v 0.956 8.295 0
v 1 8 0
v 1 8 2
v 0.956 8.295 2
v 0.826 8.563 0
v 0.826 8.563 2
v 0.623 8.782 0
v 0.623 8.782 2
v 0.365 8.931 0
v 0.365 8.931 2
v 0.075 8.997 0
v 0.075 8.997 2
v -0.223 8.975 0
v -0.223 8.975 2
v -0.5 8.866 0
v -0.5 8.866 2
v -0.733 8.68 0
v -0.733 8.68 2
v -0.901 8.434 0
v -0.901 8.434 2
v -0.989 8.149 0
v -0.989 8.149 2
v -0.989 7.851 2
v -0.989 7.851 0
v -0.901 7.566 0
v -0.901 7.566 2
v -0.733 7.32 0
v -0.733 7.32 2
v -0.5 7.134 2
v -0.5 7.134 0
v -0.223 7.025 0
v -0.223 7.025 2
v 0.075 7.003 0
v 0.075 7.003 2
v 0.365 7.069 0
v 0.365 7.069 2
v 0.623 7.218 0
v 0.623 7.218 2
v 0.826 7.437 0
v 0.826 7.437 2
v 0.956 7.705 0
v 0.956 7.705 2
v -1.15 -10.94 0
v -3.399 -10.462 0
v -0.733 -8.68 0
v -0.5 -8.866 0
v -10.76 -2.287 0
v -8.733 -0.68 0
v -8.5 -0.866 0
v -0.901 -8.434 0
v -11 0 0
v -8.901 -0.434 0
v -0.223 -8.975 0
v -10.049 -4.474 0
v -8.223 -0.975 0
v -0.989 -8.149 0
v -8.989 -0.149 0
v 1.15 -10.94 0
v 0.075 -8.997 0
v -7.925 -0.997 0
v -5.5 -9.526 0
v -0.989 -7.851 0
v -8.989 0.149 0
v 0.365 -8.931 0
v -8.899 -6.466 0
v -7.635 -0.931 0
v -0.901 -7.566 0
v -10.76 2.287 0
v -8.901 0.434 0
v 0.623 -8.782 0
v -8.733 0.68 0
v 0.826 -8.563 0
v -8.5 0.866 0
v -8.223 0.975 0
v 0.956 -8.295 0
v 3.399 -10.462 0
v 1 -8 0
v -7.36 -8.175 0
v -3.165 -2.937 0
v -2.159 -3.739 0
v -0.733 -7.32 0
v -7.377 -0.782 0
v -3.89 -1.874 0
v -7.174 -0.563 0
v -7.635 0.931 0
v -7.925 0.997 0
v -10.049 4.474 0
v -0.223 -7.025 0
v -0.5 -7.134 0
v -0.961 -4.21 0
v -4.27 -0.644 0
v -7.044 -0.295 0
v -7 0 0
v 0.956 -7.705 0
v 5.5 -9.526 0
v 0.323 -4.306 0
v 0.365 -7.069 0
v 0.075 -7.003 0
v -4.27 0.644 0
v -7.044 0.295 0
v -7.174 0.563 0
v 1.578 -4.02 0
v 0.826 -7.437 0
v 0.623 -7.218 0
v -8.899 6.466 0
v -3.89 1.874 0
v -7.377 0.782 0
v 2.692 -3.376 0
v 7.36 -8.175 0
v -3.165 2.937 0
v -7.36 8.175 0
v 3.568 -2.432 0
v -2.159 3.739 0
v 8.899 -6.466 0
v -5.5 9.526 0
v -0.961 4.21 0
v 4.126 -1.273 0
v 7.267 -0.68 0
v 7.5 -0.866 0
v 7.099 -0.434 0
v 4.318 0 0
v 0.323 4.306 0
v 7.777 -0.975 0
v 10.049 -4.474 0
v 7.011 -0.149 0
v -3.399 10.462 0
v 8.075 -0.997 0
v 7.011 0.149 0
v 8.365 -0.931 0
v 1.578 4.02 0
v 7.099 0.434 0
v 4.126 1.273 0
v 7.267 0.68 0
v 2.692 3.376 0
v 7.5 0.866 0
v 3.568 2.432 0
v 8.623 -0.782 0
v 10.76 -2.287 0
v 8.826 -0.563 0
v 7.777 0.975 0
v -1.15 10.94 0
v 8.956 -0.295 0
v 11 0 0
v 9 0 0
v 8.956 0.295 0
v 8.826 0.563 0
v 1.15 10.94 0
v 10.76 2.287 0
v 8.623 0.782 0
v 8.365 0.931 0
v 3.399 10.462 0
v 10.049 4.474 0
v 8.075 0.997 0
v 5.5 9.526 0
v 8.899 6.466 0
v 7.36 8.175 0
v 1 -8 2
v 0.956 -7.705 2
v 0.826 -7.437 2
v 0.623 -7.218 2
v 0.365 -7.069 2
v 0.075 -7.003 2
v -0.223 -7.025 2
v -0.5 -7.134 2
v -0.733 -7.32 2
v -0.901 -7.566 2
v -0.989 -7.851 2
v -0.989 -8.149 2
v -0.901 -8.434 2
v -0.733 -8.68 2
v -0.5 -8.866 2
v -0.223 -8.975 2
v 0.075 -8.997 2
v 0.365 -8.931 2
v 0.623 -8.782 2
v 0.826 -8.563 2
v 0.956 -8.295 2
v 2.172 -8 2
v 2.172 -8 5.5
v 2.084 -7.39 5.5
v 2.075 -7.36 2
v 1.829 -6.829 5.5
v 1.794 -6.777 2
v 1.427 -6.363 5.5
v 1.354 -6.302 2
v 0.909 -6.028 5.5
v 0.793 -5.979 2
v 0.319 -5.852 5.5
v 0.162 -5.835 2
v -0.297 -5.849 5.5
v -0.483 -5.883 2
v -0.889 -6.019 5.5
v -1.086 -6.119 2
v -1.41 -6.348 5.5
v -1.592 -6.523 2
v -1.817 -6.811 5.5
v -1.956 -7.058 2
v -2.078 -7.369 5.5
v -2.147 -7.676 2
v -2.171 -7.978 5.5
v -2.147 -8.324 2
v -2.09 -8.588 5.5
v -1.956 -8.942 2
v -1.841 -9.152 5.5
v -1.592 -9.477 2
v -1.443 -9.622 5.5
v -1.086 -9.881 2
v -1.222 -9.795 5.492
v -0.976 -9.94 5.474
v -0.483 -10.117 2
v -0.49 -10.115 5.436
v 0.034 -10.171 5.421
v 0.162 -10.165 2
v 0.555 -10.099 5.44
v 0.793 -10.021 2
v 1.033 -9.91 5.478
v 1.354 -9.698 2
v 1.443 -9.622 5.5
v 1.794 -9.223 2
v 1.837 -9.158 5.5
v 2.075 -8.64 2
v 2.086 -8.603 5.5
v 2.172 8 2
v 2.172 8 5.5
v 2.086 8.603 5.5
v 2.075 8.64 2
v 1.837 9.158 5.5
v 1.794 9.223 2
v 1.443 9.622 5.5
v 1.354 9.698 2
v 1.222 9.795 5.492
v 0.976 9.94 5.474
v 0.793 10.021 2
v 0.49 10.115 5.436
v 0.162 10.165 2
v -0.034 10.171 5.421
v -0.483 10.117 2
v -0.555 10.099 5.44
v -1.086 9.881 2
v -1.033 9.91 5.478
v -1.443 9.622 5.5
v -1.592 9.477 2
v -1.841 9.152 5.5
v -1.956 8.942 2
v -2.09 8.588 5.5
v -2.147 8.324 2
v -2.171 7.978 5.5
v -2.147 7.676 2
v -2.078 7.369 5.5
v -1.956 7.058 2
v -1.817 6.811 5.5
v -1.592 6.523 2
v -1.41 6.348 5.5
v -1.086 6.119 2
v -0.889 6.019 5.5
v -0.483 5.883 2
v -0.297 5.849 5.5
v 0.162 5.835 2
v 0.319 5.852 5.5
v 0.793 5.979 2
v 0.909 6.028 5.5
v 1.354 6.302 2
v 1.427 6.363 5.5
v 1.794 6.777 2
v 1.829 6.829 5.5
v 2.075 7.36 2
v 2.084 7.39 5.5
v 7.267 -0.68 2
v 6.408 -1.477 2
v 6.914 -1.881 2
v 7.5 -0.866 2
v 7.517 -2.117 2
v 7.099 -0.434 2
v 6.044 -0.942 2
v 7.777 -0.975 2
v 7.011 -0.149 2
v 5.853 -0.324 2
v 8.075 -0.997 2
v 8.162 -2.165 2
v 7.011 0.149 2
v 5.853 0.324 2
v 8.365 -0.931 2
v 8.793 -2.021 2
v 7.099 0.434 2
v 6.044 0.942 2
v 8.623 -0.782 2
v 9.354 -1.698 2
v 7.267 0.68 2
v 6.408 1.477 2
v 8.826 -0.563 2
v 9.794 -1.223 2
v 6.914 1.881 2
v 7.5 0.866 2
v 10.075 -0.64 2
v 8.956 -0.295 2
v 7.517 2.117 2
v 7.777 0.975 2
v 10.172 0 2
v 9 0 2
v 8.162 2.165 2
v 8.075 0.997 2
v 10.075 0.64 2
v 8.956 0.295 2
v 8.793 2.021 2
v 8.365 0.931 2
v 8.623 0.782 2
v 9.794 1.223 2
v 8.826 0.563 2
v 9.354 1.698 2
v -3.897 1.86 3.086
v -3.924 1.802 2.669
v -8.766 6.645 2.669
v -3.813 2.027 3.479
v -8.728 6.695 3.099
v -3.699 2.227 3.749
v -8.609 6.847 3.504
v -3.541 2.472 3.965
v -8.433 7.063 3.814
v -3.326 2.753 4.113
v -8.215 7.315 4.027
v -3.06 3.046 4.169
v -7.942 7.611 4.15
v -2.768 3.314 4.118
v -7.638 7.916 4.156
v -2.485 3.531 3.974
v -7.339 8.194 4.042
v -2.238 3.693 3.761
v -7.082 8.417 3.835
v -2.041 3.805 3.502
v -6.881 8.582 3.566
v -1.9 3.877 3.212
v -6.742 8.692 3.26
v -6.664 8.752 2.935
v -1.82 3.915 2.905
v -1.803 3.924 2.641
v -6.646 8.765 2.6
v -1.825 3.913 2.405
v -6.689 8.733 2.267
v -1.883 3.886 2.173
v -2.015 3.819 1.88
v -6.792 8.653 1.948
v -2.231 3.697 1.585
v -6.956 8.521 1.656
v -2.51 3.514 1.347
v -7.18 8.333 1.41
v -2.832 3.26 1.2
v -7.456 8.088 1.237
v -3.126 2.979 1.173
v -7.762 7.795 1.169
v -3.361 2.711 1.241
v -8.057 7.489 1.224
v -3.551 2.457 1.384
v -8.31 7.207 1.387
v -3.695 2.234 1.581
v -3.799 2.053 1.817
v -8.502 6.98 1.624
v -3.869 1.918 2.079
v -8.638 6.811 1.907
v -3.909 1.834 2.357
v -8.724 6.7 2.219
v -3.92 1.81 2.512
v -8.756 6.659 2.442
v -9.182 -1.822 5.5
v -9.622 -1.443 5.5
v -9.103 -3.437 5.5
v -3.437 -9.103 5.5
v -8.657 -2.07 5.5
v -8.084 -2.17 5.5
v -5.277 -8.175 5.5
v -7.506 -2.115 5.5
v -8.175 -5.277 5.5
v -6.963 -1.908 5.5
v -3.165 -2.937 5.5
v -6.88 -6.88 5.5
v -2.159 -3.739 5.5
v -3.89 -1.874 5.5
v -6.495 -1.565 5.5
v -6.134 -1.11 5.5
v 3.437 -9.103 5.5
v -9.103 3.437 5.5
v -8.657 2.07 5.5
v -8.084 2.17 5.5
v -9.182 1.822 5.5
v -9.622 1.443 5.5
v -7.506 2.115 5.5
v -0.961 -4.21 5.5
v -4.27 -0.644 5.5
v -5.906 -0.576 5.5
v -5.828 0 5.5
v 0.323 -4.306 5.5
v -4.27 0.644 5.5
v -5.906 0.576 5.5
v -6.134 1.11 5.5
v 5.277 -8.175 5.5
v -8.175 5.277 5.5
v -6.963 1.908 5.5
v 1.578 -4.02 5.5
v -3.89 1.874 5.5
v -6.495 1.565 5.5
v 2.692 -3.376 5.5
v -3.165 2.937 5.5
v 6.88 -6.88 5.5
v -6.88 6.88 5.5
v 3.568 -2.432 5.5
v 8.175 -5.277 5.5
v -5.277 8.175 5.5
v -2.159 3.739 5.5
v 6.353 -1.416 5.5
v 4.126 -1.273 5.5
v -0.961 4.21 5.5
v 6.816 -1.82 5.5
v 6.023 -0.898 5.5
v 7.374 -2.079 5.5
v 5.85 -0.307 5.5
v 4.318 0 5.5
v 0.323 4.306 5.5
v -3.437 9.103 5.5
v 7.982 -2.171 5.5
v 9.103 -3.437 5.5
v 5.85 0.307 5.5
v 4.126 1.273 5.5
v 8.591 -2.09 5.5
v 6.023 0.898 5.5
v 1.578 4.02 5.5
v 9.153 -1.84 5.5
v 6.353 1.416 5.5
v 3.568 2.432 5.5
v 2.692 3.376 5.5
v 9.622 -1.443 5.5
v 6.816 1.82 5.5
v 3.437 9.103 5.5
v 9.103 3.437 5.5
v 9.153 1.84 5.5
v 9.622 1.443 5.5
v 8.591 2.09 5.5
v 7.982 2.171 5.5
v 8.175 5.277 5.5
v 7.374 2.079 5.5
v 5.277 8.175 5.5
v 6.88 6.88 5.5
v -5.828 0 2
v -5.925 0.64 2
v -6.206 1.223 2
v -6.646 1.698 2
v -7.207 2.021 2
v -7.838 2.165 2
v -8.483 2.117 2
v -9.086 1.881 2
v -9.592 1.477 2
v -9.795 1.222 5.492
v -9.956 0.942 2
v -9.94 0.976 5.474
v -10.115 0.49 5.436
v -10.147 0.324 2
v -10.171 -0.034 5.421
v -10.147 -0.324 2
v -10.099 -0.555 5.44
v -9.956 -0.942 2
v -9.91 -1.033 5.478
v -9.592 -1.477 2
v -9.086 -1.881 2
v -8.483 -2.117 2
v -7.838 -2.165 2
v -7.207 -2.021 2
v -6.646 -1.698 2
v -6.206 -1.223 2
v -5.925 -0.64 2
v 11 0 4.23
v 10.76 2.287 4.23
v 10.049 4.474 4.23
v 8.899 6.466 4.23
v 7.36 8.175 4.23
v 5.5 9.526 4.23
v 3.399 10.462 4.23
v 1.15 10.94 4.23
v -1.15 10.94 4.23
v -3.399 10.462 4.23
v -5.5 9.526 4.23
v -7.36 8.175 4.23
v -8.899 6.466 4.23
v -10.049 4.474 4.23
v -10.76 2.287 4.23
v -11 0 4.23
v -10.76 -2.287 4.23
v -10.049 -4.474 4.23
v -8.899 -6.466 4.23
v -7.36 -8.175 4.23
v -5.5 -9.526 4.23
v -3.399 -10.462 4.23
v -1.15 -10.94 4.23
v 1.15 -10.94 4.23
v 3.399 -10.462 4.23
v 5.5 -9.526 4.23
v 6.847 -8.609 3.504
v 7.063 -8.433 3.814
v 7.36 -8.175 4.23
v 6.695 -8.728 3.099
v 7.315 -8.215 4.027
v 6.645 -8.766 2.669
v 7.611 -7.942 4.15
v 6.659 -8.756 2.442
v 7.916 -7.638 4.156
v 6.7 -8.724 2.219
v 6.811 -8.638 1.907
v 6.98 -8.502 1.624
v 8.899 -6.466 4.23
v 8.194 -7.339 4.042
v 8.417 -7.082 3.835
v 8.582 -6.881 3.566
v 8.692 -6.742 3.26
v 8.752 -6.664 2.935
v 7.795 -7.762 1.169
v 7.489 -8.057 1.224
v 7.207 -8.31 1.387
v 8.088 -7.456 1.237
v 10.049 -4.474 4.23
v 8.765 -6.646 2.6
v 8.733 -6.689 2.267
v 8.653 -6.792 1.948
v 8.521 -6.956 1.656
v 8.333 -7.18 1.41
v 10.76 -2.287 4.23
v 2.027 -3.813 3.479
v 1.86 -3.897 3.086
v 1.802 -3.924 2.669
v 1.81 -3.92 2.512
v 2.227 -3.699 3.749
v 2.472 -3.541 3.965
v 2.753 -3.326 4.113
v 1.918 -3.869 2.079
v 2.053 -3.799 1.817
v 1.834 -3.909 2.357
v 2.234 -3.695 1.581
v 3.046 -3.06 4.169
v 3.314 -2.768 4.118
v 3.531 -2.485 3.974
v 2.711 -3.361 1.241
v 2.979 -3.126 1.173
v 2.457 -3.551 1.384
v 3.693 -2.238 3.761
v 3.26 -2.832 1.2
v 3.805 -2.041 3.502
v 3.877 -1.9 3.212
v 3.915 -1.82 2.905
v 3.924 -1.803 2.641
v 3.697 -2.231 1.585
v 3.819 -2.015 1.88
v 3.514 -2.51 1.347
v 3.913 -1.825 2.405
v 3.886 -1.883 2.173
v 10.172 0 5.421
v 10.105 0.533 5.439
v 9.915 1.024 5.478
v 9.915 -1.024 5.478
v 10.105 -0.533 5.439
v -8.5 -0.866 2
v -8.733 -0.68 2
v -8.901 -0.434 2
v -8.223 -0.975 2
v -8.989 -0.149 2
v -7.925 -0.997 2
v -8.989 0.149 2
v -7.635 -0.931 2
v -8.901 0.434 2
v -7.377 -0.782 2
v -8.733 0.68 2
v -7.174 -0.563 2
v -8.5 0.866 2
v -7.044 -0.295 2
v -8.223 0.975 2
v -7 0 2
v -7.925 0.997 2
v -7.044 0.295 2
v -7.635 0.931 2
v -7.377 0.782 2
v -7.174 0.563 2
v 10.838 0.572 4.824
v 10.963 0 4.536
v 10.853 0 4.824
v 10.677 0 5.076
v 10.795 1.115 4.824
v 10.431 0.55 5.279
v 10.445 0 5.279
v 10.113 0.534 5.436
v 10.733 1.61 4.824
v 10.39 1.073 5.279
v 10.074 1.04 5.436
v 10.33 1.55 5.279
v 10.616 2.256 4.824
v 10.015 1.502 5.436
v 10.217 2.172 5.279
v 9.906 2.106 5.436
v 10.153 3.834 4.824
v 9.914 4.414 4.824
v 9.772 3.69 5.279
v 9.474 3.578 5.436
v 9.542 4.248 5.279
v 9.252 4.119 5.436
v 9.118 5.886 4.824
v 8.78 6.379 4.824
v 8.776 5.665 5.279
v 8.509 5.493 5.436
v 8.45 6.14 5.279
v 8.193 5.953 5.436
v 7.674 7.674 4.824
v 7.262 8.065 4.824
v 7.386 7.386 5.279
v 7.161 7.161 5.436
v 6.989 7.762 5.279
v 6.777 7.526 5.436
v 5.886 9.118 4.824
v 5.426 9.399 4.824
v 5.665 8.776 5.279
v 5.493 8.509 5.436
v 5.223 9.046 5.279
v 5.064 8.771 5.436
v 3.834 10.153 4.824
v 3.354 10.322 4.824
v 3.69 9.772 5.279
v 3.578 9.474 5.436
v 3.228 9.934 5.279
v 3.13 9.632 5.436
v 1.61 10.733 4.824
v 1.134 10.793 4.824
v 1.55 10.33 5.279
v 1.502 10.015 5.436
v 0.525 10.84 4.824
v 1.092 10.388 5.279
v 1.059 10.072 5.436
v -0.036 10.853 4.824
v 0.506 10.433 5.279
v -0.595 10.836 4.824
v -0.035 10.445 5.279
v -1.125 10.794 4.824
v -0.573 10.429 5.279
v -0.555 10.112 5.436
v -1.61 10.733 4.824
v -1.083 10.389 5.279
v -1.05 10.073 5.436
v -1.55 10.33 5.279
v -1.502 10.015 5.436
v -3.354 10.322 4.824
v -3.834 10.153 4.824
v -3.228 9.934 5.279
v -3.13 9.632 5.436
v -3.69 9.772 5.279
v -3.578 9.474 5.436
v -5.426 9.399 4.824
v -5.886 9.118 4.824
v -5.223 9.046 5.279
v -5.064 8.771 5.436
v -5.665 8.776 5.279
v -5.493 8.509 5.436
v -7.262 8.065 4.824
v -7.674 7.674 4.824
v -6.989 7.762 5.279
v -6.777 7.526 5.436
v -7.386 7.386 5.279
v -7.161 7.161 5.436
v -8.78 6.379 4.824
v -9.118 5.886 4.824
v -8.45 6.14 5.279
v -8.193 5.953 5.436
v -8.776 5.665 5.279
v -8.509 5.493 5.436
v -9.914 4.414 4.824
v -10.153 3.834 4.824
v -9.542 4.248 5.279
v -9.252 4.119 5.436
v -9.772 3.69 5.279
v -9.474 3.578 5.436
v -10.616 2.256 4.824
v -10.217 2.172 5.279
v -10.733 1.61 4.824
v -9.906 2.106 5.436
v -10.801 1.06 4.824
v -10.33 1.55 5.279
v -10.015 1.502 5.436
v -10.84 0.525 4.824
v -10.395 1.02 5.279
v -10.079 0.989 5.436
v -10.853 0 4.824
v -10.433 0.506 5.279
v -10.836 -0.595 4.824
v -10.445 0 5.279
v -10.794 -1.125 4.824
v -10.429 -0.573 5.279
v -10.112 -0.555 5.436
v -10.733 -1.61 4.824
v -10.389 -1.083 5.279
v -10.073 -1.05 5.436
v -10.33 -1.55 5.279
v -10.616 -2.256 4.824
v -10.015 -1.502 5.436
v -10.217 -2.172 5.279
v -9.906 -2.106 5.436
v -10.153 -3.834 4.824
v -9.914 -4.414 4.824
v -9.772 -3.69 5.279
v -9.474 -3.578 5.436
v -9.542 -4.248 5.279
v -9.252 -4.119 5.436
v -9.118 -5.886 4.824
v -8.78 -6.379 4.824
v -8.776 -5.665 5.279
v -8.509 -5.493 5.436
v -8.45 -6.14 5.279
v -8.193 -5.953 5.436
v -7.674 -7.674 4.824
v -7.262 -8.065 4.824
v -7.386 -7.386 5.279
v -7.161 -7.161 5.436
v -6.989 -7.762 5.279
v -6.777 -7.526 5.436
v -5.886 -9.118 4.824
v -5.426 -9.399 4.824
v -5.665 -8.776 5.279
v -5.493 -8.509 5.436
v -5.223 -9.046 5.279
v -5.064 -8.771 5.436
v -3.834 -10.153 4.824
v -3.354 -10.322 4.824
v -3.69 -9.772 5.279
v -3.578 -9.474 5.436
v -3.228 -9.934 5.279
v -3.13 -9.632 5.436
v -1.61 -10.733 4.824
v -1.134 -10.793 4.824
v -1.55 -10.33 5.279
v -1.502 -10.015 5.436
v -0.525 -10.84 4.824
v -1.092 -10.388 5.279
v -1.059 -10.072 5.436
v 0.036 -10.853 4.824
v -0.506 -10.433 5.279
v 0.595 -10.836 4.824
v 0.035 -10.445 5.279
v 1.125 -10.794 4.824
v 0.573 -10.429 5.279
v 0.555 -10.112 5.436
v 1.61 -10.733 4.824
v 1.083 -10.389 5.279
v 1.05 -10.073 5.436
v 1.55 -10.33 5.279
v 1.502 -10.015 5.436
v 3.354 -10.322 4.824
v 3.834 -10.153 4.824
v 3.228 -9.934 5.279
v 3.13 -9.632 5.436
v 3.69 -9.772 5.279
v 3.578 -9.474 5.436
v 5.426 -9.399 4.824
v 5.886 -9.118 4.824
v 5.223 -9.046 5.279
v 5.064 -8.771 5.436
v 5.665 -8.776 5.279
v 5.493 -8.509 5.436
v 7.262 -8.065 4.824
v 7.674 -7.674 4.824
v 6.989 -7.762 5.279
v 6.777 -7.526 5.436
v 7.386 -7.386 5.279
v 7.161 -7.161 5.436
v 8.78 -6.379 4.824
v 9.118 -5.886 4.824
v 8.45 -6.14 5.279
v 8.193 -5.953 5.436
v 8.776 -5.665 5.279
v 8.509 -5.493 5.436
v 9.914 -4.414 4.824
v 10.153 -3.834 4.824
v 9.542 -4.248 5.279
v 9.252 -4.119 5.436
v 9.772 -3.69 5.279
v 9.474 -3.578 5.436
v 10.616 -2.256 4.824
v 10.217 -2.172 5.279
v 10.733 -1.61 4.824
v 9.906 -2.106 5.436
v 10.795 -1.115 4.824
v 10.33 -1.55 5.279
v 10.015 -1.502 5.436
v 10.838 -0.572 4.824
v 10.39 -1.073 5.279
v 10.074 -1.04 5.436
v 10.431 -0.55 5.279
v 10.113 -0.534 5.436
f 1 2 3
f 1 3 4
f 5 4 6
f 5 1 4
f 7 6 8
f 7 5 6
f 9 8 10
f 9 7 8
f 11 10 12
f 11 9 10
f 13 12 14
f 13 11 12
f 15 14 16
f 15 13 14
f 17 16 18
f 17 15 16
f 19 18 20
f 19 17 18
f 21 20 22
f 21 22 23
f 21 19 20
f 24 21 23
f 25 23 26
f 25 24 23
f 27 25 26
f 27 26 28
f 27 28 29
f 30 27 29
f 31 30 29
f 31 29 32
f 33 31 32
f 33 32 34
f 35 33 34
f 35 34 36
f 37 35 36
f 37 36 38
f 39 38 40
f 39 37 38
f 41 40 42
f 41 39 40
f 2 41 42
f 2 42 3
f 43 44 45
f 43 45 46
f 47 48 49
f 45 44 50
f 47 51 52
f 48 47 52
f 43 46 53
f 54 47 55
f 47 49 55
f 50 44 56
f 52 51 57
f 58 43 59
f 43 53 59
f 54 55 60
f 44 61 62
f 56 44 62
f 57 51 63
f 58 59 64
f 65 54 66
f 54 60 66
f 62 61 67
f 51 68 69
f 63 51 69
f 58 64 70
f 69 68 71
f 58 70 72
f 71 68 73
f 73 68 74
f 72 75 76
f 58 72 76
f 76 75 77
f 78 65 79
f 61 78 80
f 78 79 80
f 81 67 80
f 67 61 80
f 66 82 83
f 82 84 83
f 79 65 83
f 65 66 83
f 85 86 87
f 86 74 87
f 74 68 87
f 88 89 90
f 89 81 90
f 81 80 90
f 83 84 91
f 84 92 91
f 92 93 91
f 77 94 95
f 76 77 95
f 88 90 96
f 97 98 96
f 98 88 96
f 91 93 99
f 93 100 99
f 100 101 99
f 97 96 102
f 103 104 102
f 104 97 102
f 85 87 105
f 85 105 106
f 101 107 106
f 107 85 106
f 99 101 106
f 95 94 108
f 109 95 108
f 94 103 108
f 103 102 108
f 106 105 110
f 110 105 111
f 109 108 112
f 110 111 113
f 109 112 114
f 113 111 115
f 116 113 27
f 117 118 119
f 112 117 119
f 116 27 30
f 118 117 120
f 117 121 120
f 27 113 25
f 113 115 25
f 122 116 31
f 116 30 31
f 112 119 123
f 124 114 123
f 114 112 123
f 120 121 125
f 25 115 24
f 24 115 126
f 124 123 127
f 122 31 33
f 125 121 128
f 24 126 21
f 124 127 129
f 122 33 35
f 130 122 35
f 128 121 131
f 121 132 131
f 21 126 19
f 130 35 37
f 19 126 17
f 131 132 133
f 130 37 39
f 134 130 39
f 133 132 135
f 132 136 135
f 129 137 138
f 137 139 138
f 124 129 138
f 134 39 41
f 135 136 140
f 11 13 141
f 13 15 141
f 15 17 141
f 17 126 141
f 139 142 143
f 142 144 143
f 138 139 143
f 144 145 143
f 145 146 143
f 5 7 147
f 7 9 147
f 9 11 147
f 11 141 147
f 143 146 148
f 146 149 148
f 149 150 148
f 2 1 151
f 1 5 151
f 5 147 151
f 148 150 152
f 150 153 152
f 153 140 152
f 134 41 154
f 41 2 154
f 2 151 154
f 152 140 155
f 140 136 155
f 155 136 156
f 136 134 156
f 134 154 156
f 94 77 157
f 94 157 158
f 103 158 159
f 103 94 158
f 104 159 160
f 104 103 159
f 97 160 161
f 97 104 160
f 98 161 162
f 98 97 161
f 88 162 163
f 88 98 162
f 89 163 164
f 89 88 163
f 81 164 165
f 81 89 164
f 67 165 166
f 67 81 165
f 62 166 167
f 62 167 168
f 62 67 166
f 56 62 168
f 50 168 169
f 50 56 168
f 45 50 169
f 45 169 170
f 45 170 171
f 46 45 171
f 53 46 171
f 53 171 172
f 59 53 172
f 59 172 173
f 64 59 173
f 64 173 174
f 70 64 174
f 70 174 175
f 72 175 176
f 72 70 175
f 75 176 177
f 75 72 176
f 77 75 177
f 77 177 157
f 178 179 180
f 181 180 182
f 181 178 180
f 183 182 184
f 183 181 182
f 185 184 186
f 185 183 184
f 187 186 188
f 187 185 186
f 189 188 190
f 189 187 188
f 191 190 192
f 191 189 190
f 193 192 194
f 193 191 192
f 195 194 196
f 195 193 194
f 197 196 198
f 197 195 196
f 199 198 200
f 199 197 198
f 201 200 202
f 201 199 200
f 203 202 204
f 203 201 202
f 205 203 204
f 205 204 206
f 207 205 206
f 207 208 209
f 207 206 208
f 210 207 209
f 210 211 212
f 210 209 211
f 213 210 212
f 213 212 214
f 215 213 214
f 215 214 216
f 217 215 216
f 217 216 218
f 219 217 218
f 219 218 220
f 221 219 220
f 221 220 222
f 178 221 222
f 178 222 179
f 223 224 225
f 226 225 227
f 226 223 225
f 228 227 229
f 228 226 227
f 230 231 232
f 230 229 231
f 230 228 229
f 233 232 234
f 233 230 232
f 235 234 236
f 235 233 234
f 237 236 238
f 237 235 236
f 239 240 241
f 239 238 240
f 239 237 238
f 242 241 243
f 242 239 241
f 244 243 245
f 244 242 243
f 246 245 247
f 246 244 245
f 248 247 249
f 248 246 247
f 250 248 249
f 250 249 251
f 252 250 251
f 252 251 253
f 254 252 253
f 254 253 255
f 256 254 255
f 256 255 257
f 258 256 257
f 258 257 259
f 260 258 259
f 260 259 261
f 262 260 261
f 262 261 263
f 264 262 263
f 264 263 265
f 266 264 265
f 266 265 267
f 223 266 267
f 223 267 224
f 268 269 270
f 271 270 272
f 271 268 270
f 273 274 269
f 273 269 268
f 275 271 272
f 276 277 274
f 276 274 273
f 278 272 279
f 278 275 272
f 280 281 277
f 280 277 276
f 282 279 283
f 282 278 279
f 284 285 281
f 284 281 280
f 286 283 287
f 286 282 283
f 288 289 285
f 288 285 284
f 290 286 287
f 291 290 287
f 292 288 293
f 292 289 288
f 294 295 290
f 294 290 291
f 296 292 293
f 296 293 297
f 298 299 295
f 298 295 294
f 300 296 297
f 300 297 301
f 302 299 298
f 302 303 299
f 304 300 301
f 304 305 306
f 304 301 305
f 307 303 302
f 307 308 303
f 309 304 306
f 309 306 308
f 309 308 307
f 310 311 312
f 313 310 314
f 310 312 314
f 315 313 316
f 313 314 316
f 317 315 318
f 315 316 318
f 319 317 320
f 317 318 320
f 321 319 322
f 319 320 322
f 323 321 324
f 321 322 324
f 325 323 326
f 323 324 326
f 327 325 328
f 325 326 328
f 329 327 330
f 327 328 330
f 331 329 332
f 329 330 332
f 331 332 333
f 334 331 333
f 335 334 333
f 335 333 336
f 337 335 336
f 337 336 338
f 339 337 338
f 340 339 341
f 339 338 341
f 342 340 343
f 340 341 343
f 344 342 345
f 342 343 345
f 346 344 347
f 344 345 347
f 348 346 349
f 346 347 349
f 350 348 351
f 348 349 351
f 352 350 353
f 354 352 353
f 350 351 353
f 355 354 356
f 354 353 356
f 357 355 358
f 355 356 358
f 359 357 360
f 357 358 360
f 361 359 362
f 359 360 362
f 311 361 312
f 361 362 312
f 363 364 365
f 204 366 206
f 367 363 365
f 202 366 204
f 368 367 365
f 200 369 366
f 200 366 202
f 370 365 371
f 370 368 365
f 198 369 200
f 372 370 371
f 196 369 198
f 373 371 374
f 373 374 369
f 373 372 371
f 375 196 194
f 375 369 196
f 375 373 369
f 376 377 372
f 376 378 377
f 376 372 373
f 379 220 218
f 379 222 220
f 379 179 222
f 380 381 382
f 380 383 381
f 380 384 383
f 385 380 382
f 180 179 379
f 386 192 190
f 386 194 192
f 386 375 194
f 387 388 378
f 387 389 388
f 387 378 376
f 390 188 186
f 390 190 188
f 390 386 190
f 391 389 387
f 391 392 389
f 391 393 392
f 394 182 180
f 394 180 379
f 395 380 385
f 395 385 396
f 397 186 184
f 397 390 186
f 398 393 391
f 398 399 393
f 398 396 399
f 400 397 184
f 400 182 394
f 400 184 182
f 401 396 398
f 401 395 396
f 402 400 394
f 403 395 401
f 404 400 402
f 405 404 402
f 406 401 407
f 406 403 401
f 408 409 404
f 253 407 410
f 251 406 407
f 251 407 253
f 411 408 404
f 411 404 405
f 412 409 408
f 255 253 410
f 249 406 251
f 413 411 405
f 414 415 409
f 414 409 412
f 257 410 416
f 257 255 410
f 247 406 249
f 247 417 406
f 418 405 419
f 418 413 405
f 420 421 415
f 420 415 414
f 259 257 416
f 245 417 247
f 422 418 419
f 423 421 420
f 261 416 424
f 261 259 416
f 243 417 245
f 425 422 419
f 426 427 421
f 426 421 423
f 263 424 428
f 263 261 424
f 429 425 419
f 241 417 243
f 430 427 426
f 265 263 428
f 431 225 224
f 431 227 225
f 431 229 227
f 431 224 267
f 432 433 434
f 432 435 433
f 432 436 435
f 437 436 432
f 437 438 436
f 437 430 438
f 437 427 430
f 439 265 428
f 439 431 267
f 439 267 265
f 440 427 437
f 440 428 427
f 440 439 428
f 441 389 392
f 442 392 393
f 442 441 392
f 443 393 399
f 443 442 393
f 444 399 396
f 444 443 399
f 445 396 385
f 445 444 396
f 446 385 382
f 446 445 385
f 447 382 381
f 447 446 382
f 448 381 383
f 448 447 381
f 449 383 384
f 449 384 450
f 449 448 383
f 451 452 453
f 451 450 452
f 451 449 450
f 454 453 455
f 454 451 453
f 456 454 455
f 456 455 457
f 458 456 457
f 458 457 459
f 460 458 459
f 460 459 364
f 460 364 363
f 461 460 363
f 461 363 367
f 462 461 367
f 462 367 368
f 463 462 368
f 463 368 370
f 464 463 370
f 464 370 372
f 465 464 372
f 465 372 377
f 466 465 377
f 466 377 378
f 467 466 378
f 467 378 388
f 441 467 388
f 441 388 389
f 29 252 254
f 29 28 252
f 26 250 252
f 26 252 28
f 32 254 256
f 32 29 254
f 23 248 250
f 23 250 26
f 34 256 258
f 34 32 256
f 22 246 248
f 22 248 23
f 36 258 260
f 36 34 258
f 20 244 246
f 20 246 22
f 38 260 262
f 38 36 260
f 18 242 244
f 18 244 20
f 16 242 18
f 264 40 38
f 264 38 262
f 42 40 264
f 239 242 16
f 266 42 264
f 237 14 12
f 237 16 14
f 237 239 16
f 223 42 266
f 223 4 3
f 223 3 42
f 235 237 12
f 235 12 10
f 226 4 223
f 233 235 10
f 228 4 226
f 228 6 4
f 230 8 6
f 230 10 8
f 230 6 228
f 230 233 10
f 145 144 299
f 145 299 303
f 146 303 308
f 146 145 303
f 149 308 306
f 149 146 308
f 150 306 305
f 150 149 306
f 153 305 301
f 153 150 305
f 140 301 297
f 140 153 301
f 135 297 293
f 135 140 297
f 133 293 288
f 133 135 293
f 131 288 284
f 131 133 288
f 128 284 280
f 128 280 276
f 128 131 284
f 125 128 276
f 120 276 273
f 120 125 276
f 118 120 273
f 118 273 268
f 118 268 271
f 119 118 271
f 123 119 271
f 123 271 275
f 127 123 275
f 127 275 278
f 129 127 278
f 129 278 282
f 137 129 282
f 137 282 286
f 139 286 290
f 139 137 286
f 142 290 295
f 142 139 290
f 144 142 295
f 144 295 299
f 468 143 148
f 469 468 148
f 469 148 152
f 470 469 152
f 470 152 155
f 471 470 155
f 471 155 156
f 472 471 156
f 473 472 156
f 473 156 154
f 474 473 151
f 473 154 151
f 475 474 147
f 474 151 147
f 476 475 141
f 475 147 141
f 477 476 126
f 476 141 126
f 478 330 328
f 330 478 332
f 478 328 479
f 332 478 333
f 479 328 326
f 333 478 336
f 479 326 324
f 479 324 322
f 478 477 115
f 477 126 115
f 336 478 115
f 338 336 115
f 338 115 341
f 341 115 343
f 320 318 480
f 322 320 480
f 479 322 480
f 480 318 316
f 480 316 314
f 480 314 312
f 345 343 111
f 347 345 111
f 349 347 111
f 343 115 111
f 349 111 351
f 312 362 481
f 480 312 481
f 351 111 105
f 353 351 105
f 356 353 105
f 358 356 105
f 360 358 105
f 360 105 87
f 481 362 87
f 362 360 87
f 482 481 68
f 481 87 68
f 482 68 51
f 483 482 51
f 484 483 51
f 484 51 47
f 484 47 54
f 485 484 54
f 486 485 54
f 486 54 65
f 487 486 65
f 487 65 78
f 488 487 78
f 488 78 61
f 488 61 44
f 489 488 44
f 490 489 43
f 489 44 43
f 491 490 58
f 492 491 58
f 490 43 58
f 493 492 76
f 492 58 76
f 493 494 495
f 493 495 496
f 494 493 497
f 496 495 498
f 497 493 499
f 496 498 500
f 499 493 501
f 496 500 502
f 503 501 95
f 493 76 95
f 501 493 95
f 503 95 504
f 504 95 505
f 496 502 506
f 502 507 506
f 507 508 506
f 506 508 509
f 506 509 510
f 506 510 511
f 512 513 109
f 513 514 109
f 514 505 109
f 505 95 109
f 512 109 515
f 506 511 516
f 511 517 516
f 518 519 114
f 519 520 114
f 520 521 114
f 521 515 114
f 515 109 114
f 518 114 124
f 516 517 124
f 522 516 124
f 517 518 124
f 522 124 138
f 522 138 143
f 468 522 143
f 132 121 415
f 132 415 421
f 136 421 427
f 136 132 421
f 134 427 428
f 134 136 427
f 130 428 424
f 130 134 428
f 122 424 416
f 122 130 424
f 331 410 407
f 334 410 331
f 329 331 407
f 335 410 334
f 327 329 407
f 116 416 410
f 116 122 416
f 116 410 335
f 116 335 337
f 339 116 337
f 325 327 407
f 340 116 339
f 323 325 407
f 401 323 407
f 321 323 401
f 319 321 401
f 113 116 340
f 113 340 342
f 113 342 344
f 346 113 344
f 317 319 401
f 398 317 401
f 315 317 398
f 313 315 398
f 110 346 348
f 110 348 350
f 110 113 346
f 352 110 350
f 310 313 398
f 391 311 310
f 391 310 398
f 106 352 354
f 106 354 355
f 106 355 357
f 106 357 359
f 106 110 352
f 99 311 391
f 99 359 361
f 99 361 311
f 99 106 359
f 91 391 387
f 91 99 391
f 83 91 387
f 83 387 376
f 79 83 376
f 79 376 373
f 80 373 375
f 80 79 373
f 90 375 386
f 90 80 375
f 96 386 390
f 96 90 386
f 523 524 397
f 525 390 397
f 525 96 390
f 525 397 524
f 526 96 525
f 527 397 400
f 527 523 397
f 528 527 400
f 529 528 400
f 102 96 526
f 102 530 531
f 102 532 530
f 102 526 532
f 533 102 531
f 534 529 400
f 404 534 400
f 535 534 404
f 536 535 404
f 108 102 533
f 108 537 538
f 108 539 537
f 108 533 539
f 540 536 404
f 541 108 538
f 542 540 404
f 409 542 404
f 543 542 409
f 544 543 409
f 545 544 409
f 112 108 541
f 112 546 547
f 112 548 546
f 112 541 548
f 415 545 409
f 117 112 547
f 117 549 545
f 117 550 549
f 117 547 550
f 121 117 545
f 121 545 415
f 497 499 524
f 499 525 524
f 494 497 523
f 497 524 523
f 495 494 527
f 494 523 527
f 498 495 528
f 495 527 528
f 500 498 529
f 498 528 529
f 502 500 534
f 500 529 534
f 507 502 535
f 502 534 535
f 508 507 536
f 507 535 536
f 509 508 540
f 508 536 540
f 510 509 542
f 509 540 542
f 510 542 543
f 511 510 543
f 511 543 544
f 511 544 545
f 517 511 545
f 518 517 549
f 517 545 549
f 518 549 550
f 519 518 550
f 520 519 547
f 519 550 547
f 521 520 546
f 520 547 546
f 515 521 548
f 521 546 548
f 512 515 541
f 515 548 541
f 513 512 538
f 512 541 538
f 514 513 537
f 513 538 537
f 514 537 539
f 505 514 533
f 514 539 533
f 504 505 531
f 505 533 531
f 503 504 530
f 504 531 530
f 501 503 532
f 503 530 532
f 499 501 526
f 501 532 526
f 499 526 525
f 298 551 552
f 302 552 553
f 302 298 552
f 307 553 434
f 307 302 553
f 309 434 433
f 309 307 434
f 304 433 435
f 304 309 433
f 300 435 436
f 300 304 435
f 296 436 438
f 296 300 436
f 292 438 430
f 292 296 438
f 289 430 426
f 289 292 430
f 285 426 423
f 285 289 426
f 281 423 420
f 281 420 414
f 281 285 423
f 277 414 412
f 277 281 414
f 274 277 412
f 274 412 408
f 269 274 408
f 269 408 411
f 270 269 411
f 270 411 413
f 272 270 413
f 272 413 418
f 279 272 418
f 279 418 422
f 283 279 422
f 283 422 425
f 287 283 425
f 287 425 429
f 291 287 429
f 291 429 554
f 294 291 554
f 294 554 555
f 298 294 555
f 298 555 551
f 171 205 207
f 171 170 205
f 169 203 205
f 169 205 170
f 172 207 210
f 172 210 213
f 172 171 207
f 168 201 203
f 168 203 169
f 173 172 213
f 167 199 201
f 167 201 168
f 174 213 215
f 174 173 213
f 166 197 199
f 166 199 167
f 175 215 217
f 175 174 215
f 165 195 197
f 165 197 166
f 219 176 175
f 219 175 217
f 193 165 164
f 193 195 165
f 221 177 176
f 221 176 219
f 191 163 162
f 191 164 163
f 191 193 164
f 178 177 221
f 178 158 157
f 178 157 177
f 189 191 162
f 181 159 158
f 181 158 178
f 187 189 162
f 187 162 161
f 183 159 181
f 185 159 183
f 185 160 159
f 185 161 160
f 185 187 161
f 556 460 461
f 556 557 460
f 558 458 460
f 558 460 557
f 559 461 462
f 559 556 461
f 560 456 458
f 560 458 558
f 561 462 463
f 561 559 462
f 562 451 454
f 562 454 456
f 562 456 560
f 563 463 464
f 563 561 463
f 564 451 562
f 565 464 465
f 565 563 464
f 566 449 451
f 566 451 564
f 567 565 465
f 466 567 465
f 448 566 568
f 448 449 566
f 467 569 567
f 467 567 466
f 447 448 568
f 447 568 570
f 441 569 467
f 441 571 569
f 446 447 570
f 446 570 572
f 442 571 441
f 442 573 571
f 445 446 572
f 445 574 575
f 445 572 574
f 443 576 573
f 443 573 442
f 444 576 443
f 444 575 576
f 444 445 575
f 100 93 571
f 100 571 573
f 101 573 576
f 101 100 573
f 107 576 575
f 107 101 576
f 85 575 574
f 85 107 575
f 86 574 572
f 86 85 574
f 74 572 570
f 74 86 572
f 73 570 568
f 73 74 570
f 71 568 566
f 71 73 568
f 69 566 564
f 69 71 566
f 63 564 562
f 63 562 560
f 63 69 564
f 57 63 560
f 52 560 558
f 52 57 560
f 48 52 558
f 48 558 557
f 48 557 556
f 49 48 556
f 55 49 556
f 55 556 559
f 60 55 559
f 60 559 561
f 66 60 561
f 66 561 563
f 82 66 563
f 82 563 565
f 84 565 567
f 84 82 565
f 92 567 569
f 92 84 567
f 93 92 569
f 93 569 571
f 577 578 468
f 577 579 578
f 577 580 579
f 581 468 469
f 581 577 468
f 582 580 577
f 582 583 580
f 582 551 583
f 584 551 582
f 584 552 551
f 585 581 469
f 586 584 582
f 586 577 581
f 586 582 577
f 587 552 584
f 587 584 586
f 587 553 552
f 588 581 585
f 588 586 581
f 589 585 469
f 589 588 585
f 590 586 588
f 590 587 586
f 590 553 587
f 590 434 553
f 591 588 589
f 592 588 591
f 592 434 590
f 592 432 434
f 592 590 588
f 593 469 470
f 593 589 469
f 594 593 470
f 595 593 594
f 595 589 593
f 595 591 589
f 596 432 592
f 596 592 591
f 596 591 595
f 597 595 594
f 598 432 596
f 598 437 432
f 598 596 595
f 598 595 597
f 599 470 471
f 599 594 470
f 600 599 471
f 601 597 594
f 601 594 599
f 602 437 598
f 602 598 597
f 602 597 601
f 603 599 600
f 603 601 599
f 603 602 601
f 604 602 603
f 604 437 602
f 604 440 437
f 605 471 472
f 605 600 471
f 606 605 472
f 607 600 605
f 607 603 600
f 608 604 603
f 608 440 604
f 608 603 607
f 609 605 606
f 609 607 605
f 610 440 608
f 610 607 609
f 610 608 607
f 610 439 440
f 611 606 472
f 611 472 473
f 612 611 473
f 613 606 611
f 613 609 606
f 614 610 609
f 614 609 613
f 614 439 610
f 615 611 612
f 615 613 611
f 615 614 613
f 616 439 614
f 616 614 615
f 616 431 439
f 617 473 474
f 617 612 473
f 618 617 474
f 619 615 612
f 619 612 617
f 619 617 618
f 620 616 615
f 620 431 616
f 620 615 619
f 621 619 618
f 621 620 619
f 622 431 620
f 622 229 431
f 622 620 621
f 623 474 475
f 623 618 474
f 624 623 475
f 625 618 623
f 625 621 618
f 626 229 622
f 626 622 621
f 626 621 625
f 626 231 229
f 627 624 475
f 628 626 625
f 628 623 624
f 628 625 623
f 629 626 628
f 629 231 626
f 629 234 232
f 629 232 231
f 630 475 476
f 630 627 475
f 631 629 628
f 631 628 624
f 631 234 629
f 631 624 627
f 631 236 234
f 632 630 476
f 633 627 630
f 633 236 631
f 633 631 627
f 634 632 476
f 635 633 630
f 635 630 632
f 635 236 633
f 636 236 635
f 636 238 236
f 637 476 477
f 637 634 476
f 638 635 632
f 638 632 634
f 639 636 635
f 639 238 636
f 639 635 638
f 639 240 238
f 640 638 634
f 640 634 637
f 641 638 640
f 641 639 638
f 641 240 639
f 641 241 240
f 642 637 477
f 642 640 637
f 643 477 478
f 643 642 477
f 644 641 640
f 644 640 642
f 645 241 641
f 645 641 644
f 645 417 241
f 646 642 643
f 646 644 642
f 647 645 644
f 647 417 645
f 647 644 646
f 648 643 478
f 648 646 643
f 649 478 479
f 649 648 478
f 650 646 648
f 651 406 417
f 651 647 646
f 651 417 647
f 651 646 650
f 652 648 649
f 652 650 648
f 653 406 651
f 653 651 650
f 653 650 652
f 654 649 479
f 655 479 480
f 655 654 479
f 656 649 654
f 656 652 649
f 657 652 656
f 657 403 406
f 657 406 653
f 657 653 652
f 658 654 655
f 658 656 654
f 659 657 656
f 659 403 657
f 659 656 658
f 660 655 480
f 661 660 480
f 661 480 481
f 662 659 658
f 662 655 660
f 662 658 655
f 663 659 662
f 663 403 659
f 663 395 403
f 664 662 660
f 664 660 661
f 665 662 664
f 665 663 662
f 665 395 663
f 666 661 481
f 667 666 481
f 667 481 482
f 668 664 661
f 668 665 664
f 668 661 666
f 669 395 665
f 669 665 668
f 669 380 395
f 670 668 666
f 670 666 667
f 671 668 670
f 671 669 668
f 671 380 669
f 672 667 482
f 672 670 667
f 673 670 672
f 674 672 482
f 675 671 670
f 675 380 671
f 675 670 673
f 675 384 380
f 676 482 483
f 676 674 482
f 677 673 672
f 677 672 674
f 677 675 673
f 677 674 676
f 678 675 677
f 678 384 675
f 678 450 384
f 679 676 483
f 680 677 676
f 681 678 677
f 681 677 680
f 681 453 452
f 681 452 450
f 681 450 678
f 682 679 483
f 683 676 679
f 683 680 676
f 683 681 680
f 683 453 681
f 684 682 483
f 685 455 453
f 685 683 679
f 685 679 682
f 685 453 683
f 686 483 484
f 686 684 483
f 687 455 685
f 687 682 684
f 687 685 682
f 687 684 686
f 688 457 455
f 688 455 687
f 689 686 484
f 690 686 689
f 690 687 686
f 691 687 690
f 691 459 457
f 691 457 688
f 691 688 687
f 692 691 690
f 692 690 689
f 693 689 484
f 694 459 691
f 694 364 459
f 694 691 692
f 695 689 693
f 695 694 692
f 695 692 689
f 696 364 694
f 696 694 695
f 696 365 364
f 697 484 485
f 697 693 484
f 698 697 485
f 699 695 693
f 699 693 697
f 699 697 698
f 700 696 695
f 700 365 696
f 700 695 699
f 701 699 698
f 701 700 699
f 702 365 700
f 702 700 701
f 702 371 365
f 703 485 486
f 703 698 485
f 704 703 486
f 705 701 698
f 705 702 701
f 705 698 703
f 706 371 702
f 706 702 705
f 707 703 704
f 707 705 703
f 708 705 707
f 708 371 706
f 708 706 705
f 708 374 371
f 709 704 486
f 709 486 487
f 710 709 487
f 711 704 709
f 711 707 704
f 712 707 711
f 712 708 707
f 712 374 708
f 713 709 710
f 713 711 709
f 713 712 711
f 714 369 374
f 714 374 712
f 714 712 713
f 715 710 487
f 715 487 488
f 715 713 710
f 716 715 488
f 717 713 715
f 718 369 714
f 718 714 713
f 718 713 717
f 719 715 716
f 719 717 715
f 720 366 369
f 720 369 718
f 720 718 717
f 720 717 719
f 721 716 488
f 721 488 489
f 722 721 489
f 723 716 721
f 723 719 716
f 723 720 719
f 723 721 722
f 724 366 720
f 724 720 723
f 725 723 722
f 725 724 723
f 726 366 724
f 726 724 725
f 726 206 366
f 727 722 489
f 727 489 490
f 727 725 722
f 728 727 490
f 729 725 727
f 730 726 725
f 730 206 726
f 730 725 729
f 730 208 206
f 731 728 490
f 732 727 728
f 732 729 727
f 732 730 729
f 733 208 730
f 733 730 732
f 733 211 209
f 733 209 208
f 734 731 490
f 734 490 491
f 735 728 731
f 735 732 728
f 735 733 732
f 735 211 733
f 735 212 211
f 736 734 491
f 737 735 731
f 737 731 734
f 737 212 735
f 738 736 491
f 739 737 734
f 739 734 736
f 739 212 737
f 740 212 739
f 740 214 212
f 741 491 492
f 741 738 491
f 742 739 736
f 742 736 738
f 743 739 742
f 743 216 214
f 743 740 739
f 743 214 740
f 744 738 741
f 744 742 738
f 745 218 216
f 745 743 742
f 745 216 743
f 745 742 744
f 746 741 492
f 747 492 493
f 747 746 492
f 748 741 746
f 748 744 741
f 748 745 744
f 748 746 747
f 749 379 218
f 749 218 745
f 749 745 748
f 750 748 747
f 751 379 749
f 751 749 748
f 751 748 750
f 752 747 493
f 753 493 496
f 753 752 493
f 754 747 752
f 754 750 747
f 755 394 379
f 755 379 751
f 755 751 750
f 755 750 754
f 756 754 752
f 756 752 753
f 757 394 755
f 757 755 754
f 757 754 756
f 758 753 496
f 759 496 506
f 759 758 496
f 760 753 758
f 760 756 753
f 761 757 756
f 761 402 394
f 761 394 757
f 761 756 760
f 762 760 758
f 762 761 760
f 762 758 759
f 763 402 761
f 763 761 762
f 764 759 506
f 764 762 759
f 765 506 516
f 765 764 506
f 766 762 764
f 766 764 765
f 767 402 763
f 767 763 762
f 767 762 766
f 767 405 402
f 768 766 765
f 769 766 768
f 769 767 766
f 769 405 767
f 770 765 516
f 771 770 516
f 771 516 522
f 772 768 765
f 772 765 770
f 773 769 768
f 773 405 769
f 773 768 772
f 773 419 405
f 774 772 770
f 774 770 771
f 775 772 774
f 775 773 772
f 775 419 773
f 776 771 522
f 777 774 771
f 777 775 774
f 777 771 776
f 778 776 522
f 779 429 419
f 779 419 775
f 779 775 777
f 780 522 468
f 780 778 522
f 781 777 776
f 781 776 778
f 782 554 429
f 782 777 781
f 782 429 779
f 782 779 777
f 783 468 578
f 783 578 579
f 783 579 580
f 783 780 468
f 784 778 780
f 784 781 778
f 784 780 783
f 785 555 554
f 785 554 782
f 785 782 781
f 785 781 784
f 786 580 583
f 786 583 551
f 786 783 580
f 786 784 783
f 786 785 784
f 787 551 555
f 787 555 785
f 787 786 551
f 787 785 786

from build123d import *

# Parameters (mm, degrees)
SKETCH2_R           = 11
SKETCH2_R_2         = 4.318
SKETCH2_R_3         = 1
BOSS_EXTRUDE1_DEPTH = 2
SKETCH3_R           = 11
SKETCH3_R_2         = 4.318
SKETCH3_R_3         = 2.171511002
BOSS_EXTRUDE2_DEPTH = 3.5
SKETCH5_R           = 1.5
CUT_EXTRUDE1_DEPTH  = 127
FILLET1_R           = 1.27


with BuildPart() as part:
    # Sketch2 → Boss-Extrude1 (new body)
    with BuildSketch(Plane.XY):
        Circle(SKETCH2_R)
        Circle(SKETCH2_R_2, mode=Mode.SUBTRACT)
        with Locations((0, 8)):
            Circle(SKETCH2_R_3, mode=Mode.SUBTRACT)
        with Locations((8, 0)):
            Circle(SKETCH2_R_3, mode=Mode.SUBTRACT)
        with Locations((0, -8)):
            Circle(SKETCH2_R_3, mode=Mode.SUBTRACT)
        with Locations((-8, 0)):
            Circle(SKETCH2_R_3, mode=Mode.SUBTRACT)
    extrude(amount=BOSS_EXTRUDE1_DEPTH)

    # Sketch3 → Boss-Extrude2 (add)
    with BuildSketch(Plane.XY.offset(2)):
        Circle(SKETCH3_R)
        Circle(SKETCH3_R_2, mode=Mode.SUBTRACT)
        with Locations((0, 8)):
            Circle(SKETCH3_R_3, mode=Mode.SUBTRACT)
        with Locations((8, 0)):
            Circle(SKETCH3_R_3, mode=Mode.SUBTRACT)
        with Locations((0, -8)):
            Circle(SKETCH3_R_3, mode=Mode.SUBTRACT)
        with Locations((-8, 0)):
            Circle(SKETCH3_R_3, mode=Mode.SUBTRACT)
    extrude(amount=BOSS_EXTRUDE2_DEPTH)

    # Sketch5 → Cut-Extrude1 (cut, symmetric)
    with BuildSketch(Plane(origin=(0, 0, 0), x_dir=(0.7071067811865477, 0.7071067811865475, 0), z_dir=(-0.7071067811865475, 0.7071067811865477, 0))):
        with Locations(Location((0, -2.668898501, 0), (0, 0, 180))):
            Circle(SKETCH5_R)
    extrude(amount=CUT_EXTRUDE1_DEPTH, both=True, mode=Mode.SUBTRACT)

    # Fillet1
    # the kernel refuses this fillet: 1.27 mm, written as the material it takes off along each edge
    with BuildSketch(Plane(origin=(0, 0, 5.5), x_dir=(1, 0, 0), z_dir=(0, -1, 0))) as fillet1_piece_1:
        with BuildLine():
            CenterArc((11 - FILLET1_R, -FILLET1_R), FILLET1_R, 0, 90)
            Line((11 - FILLET1_R, 0), (11, 0))
            Line((11, 0), (11, -FILLET1_R))
        make_face()
    revolve(axis=Axis((0, 0, 5.5), (0, 0, 1)), mode=Mode.SUBTRACT)


solid = part.part
